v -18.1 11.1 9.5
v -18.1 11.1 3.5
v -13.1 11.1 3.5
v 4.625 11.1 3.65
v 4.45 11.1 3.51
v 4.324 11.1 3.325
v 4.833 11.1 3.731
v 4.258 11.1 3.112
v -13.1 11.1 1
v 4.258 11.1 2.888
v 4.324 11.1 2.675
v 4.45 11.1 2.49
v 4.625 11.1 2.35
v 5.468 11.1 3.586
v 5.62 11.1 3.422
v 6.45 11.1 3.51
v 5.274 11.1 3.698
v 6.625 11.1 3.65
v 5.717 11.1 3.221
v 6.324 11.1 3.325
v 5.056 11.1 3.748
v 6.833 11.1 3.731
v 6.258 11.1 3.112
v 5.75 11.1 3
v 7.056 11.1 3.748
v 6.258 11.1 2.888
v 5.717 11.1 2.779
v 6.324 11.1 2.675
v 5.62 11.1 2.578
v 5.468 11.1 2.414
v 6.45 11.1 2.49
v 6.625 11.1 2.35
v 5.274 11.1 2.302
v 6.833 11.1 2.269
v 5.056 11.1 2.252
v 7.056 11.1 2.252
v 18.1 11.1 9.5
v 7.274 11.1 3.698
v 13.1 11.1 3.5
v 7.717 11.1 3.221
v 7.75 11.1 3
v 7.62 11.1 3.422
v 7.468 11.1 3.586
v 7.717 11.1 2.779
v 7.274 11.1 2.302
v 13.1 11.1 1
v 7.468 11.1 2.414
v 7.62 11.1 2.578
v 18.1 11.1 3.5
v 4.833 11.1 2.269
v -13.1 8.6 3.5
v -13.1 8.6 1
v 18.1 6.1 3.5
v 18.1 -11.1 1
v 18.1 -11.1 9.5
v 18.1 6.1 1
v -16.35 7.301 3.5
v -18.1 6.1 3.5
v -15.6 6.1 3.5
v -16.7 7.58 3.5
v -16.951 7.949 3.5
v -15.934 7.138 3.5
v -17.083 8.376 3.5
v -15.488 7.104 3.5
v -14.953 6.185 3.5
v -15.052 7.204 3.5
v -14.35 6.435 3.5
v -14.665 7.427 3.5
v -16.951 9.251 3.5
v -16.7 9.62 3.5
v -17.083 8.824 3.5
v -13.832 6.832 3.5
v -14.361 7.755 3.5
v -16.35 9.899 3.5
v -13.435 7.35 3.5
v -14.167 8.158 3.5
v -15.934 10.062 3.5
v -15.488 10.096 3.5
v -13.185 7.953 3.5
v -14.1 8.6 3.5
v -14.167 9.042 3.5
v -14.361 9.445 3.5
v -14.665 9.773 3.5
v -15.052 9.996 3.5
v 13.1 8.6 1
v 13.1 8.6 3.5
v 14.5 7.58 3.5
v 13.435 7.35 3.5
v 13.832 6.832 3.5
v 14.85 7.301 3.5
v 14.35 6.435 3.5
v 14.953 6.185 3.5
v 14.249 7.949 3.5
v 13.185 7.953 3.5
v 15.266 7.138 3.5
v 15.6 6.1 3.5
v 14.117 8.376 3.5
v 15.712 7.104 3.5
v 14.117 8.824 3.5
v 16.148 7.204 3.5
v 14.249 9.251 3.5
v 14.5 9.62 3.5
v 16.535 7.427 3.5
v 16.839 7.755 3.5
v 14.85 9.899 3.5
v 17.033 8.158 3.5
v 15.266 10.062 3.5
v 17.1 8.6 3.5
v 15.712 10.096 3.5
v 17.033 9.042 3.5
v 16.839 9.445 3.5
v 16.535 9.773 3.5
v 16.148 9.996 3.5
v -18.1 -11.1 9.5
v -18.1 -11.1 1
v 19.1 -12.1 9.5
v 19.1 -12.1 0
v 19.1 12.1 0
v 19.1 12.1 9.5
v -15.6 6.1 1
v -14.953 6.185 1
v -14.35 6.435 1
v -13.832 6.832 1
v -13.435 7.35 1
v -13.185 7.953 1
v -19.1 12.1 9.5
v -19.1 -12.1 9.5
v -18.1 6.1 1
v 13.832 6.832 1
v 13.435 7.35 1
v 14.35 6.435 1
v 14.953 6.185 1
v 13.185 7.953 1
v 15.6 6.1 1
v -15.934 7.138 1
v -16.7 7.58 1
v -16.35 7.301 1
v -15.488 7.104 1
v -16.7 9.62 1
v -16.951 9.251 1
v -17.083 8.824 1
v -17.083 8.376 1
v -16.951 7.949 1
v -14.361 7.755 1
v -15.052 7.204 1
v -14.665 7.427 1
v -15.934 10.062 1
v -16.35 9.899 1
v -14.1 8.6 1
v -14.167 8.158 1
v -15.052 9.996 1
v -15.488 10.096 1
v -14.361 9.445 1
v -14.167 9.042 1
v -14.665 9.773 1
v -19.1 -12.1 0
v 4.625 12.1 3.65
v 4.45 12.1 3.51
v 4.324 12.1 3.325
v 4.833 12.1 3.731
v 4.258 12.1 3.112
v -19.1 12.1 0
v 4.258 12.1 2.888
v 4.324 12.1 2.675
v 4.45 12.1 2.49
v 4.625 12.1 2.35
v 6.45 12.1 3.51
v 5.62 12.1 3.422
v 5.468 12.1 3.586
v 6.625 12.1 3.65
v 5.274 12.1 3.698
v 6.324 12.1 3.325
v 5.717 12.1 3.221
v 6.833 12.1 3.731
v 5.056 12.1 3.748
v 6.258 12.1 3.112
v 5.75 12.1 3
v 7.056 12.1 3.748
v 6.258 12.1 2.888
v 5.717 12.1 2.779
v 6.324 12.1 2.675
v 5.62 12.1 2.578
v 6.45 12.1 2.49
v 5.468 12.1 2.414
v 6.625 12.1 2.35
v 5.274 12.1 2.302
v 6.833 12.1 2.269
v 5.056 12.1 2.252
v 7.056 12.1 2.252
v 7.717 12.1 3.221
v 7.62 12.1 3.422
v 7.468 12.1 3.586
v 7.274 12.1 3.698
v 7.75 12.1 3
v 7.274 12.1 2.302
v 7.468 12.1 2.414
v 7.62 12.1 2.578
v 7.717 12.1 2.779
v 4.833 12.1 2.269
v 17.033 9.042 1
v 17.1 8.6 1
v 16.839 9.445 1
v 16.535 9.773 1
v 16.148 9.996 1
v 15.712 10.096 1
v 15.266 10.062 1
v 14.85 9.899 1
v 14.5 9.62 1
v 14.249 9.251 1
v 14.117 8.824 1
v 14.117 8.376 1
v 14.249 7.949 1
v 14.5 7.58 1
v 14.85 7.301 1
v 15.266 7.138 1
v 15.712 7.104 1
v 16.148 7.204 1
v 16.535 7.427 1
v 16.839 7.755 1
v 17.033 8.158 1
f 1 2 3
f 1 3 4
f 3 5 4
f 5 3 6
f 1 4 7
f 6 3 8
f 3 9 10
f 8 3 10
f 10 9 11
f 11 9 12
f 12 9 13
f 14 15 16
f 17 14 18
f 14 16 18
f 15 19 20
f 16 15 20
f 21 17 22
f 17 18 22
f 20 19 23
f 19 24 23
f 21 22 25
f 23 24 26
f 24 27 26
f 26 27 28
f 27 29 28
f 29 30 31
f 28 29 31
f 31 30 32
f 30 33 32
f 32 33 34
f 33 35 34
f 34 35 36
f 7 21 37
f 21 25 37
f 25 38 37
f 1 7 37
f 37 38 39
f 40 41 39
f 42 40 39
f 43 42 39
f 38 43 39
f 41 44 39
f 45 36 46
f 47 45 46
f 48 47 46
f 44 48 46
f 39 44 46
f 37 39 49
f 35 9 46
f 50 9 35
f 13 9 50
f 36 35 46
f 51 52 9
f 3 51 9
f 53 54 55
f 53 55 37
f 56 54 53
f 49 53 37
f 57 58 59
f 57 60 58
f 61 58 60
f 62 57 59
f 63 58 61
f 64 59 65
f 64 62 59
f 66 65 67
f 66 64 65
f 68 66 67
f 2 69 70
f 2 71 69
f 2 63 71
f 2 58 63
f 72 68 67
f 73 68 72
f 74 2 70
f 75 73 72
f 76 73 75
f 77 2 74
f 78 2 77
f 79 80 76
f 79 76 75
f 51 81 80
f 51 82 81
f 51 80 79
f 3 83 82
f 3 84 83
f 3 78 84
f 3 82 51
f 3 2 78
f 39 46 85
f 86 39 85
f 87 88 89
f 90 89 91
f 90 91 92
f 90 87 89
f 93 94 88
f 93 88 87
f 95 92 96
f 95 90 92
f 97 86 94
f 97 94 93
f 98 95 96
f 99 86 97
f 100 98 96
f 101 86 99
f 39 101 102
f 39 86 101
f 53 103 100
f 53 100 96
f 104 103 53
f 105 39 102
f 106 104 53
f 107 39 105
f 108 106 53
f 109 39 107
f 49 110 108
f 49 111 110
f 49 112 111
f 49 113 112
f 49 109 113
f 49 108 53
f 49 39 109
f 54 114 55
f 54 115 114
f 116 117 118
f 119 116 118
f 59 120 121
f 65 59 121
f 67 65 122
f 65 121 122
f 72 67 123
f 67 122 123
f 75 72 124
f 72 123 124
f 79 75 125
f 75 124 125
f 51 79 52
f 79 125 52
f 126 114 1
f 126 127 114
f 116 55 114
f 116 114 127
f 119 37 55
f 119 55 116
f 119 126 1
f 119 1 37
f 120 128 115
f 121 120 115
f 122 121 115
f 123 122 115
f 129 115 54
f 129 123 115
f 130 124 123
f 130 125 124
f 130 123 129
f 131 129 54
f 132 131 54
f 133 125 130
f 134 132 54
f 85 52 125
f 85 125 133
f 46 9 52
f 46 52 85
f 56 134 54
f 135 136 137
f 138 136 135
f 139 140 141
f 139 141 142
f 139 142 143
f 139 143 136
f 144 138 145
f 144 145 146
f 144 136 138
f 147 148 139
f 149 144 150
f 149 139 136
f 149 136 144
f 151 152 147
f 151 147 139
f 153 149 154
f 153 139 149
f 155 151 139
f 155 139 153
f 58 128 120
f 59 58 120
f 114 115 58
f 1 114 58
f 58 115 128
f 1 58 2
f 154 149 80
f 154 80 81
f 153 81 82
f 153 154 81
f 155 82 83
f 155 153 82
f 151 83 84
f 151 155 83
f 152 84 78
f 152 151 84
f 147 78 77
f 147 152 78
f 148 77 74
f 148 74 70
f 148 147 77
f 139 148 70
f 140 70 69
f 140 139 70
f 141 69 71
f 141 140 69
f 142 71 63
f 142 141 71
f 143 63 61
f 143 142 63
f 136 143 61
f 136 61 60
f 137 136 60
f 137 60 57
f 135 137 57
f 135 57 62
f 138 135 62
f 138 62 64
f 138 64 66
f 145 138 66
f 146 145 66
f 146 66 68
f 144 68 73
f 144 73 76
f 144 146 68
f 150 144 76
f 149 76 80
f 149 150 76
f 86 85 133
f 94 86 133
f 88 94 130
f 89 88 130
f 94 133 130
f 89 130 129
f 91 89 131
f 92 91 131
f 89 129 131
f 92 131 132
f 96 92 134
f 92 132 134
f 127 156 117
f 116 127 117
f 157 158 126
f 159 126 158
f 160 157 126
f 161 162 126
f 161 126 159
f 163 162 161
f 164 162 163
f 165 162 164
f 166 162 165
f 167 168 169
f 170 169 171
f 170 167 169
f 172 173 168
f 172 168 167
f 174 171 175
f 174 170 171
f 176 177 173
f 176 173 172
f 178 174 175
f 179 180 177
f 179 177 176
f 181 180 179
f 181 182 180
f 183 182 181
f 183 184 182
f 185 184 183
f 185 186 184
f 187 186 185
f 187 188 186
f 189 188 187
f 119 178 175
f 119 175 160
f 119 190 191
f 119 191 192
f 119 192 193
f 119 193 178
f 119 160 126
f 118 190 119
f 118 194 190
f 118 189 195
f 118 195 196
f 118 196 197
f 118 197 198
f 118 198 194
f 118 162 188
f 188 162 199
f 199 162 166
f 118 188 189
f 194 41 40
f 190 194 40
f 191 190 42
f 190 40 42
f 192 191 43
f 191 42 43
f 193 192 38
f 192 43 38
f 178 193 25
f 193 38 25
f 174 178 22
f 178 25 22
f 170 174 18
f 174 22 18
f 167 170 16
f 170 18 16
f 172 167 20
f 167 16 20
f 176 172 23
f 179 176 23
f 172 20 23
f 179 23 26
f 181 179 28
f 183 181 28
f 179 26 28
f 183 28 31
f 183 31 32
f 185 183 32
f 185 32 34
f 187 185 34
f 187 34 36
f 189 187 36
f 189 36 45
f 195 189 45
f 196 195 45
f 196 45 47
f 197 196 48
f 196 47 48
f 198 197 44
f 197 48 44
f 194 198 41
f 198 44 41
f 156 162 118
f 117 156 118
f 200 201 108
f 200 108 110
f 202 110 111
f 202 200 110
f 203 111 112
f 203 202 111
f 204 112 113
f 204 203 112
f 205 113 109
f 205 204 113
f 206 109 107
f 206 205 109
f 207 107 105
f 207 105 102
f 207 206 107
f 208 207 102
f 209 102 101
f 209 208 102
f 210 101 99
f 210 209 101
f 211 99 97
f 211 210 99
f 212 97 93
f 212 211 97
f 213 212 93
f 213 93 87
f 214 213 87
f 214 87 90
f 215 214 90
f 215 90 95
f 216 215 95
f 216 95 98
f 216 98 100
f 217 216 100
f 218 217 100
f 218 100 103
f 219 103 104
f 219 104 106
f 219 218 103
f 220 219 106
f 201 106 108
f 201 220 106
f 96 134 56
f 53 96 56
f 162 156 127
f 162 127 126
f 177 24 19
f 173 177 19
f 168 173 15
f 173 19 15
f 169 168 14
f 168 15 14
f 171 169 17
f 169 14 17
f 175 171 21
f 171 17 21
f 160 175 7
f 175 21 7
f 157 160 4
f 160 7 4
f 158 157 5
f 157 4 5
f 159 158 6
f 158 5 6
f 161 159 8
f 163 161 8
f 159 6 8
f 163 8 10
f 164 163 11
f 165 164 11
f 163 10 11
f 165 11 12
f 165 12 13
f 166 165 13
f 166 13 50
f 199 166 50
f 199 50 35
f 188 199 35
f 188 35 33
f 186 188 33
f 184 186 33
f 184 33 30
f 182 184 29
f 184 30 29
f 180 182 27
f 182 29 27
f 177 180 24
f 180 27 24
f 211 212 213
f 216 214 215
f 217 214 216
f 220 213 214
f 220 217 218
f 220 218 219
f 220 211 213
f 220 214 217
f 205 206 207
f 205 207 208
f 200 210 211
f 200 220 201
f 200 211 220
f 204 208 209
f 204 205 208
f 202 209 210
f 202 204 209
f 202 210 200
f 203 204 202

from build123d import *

# Parameters (mm, degrees)
F0_W     = 38.2
F0_H     = 24.2
F1_DEPTH = 9.5
F2_T     = -1
F3_R     = 1.5
F4_DEPTH = 2.5
F5_R     = 0.75
F6_DEPTH = 1


with BuildPart() as f1:
    # F0 (on Top) → F1 (new body)
    with BuildSketch(Plane.XY):
        Rectangle(F0_W, F0_H)
    extrude(amount=F1_DEPTH)

    # F2
    f2_openings = [f1.faces().sort_by_distance(p)[0] for p in [
        (0, 0, 9.5),
    ]]
    offset(amount=F2_T, openings=f2_openings)

    # F3 (on face) → F4 (join)
    with BuildSketch(Plane.XY.offset(1)):
        with BuildLine():
            Line((-18.1, 6.1), (-15.6, 6.1))
            ThreePointArc((-15.6, 6.1), (-13.832233, 6.832233), (-13.1, 8.6))
            Line((-13.1, 8.6), (-13.1, 11.1))
            Line((-13.1, 11.1), (-18.1, 11.1))
            Line((-18.1, 11.1), (-18.1, 6.1))
        make_face()
        with Locations((-15.6, 8.6)):
            Circle(F3_R, mode=Mode.SUBTRACT)
        with BuildLine():
            Line((13.1, 11.1), (13.1, 8.6))
            ThreePointArc((13.1, 8.6), (13.832233, 6.832233), (15.6, 6.1))
            Line((15.6, 6.1), (18.1, 6.1))
            Line((18.1, 6.1), (18.1, 11.1))
            Line((18.1, 11.1), (13.1, 11.1))
        make_face()
        with Locations((15.6, 8.6)):
            Circle(F3_R, mode=Mode.SUBTRACT)
    extrude(amount=F4_DEPTH)

    # F5 (on face) → F6 (cut, through all)
    with BuildSketch(Plane.XZ.offset(-11.1)):
        with Locations((5, 3)):
            Circle(F5_R)
        with Locations((7, 3)):
            Circle(F5_R)
    extrude(amount=-F6_DEPTH, mode=Mode.SUBTRACT)


solid = f1.part
